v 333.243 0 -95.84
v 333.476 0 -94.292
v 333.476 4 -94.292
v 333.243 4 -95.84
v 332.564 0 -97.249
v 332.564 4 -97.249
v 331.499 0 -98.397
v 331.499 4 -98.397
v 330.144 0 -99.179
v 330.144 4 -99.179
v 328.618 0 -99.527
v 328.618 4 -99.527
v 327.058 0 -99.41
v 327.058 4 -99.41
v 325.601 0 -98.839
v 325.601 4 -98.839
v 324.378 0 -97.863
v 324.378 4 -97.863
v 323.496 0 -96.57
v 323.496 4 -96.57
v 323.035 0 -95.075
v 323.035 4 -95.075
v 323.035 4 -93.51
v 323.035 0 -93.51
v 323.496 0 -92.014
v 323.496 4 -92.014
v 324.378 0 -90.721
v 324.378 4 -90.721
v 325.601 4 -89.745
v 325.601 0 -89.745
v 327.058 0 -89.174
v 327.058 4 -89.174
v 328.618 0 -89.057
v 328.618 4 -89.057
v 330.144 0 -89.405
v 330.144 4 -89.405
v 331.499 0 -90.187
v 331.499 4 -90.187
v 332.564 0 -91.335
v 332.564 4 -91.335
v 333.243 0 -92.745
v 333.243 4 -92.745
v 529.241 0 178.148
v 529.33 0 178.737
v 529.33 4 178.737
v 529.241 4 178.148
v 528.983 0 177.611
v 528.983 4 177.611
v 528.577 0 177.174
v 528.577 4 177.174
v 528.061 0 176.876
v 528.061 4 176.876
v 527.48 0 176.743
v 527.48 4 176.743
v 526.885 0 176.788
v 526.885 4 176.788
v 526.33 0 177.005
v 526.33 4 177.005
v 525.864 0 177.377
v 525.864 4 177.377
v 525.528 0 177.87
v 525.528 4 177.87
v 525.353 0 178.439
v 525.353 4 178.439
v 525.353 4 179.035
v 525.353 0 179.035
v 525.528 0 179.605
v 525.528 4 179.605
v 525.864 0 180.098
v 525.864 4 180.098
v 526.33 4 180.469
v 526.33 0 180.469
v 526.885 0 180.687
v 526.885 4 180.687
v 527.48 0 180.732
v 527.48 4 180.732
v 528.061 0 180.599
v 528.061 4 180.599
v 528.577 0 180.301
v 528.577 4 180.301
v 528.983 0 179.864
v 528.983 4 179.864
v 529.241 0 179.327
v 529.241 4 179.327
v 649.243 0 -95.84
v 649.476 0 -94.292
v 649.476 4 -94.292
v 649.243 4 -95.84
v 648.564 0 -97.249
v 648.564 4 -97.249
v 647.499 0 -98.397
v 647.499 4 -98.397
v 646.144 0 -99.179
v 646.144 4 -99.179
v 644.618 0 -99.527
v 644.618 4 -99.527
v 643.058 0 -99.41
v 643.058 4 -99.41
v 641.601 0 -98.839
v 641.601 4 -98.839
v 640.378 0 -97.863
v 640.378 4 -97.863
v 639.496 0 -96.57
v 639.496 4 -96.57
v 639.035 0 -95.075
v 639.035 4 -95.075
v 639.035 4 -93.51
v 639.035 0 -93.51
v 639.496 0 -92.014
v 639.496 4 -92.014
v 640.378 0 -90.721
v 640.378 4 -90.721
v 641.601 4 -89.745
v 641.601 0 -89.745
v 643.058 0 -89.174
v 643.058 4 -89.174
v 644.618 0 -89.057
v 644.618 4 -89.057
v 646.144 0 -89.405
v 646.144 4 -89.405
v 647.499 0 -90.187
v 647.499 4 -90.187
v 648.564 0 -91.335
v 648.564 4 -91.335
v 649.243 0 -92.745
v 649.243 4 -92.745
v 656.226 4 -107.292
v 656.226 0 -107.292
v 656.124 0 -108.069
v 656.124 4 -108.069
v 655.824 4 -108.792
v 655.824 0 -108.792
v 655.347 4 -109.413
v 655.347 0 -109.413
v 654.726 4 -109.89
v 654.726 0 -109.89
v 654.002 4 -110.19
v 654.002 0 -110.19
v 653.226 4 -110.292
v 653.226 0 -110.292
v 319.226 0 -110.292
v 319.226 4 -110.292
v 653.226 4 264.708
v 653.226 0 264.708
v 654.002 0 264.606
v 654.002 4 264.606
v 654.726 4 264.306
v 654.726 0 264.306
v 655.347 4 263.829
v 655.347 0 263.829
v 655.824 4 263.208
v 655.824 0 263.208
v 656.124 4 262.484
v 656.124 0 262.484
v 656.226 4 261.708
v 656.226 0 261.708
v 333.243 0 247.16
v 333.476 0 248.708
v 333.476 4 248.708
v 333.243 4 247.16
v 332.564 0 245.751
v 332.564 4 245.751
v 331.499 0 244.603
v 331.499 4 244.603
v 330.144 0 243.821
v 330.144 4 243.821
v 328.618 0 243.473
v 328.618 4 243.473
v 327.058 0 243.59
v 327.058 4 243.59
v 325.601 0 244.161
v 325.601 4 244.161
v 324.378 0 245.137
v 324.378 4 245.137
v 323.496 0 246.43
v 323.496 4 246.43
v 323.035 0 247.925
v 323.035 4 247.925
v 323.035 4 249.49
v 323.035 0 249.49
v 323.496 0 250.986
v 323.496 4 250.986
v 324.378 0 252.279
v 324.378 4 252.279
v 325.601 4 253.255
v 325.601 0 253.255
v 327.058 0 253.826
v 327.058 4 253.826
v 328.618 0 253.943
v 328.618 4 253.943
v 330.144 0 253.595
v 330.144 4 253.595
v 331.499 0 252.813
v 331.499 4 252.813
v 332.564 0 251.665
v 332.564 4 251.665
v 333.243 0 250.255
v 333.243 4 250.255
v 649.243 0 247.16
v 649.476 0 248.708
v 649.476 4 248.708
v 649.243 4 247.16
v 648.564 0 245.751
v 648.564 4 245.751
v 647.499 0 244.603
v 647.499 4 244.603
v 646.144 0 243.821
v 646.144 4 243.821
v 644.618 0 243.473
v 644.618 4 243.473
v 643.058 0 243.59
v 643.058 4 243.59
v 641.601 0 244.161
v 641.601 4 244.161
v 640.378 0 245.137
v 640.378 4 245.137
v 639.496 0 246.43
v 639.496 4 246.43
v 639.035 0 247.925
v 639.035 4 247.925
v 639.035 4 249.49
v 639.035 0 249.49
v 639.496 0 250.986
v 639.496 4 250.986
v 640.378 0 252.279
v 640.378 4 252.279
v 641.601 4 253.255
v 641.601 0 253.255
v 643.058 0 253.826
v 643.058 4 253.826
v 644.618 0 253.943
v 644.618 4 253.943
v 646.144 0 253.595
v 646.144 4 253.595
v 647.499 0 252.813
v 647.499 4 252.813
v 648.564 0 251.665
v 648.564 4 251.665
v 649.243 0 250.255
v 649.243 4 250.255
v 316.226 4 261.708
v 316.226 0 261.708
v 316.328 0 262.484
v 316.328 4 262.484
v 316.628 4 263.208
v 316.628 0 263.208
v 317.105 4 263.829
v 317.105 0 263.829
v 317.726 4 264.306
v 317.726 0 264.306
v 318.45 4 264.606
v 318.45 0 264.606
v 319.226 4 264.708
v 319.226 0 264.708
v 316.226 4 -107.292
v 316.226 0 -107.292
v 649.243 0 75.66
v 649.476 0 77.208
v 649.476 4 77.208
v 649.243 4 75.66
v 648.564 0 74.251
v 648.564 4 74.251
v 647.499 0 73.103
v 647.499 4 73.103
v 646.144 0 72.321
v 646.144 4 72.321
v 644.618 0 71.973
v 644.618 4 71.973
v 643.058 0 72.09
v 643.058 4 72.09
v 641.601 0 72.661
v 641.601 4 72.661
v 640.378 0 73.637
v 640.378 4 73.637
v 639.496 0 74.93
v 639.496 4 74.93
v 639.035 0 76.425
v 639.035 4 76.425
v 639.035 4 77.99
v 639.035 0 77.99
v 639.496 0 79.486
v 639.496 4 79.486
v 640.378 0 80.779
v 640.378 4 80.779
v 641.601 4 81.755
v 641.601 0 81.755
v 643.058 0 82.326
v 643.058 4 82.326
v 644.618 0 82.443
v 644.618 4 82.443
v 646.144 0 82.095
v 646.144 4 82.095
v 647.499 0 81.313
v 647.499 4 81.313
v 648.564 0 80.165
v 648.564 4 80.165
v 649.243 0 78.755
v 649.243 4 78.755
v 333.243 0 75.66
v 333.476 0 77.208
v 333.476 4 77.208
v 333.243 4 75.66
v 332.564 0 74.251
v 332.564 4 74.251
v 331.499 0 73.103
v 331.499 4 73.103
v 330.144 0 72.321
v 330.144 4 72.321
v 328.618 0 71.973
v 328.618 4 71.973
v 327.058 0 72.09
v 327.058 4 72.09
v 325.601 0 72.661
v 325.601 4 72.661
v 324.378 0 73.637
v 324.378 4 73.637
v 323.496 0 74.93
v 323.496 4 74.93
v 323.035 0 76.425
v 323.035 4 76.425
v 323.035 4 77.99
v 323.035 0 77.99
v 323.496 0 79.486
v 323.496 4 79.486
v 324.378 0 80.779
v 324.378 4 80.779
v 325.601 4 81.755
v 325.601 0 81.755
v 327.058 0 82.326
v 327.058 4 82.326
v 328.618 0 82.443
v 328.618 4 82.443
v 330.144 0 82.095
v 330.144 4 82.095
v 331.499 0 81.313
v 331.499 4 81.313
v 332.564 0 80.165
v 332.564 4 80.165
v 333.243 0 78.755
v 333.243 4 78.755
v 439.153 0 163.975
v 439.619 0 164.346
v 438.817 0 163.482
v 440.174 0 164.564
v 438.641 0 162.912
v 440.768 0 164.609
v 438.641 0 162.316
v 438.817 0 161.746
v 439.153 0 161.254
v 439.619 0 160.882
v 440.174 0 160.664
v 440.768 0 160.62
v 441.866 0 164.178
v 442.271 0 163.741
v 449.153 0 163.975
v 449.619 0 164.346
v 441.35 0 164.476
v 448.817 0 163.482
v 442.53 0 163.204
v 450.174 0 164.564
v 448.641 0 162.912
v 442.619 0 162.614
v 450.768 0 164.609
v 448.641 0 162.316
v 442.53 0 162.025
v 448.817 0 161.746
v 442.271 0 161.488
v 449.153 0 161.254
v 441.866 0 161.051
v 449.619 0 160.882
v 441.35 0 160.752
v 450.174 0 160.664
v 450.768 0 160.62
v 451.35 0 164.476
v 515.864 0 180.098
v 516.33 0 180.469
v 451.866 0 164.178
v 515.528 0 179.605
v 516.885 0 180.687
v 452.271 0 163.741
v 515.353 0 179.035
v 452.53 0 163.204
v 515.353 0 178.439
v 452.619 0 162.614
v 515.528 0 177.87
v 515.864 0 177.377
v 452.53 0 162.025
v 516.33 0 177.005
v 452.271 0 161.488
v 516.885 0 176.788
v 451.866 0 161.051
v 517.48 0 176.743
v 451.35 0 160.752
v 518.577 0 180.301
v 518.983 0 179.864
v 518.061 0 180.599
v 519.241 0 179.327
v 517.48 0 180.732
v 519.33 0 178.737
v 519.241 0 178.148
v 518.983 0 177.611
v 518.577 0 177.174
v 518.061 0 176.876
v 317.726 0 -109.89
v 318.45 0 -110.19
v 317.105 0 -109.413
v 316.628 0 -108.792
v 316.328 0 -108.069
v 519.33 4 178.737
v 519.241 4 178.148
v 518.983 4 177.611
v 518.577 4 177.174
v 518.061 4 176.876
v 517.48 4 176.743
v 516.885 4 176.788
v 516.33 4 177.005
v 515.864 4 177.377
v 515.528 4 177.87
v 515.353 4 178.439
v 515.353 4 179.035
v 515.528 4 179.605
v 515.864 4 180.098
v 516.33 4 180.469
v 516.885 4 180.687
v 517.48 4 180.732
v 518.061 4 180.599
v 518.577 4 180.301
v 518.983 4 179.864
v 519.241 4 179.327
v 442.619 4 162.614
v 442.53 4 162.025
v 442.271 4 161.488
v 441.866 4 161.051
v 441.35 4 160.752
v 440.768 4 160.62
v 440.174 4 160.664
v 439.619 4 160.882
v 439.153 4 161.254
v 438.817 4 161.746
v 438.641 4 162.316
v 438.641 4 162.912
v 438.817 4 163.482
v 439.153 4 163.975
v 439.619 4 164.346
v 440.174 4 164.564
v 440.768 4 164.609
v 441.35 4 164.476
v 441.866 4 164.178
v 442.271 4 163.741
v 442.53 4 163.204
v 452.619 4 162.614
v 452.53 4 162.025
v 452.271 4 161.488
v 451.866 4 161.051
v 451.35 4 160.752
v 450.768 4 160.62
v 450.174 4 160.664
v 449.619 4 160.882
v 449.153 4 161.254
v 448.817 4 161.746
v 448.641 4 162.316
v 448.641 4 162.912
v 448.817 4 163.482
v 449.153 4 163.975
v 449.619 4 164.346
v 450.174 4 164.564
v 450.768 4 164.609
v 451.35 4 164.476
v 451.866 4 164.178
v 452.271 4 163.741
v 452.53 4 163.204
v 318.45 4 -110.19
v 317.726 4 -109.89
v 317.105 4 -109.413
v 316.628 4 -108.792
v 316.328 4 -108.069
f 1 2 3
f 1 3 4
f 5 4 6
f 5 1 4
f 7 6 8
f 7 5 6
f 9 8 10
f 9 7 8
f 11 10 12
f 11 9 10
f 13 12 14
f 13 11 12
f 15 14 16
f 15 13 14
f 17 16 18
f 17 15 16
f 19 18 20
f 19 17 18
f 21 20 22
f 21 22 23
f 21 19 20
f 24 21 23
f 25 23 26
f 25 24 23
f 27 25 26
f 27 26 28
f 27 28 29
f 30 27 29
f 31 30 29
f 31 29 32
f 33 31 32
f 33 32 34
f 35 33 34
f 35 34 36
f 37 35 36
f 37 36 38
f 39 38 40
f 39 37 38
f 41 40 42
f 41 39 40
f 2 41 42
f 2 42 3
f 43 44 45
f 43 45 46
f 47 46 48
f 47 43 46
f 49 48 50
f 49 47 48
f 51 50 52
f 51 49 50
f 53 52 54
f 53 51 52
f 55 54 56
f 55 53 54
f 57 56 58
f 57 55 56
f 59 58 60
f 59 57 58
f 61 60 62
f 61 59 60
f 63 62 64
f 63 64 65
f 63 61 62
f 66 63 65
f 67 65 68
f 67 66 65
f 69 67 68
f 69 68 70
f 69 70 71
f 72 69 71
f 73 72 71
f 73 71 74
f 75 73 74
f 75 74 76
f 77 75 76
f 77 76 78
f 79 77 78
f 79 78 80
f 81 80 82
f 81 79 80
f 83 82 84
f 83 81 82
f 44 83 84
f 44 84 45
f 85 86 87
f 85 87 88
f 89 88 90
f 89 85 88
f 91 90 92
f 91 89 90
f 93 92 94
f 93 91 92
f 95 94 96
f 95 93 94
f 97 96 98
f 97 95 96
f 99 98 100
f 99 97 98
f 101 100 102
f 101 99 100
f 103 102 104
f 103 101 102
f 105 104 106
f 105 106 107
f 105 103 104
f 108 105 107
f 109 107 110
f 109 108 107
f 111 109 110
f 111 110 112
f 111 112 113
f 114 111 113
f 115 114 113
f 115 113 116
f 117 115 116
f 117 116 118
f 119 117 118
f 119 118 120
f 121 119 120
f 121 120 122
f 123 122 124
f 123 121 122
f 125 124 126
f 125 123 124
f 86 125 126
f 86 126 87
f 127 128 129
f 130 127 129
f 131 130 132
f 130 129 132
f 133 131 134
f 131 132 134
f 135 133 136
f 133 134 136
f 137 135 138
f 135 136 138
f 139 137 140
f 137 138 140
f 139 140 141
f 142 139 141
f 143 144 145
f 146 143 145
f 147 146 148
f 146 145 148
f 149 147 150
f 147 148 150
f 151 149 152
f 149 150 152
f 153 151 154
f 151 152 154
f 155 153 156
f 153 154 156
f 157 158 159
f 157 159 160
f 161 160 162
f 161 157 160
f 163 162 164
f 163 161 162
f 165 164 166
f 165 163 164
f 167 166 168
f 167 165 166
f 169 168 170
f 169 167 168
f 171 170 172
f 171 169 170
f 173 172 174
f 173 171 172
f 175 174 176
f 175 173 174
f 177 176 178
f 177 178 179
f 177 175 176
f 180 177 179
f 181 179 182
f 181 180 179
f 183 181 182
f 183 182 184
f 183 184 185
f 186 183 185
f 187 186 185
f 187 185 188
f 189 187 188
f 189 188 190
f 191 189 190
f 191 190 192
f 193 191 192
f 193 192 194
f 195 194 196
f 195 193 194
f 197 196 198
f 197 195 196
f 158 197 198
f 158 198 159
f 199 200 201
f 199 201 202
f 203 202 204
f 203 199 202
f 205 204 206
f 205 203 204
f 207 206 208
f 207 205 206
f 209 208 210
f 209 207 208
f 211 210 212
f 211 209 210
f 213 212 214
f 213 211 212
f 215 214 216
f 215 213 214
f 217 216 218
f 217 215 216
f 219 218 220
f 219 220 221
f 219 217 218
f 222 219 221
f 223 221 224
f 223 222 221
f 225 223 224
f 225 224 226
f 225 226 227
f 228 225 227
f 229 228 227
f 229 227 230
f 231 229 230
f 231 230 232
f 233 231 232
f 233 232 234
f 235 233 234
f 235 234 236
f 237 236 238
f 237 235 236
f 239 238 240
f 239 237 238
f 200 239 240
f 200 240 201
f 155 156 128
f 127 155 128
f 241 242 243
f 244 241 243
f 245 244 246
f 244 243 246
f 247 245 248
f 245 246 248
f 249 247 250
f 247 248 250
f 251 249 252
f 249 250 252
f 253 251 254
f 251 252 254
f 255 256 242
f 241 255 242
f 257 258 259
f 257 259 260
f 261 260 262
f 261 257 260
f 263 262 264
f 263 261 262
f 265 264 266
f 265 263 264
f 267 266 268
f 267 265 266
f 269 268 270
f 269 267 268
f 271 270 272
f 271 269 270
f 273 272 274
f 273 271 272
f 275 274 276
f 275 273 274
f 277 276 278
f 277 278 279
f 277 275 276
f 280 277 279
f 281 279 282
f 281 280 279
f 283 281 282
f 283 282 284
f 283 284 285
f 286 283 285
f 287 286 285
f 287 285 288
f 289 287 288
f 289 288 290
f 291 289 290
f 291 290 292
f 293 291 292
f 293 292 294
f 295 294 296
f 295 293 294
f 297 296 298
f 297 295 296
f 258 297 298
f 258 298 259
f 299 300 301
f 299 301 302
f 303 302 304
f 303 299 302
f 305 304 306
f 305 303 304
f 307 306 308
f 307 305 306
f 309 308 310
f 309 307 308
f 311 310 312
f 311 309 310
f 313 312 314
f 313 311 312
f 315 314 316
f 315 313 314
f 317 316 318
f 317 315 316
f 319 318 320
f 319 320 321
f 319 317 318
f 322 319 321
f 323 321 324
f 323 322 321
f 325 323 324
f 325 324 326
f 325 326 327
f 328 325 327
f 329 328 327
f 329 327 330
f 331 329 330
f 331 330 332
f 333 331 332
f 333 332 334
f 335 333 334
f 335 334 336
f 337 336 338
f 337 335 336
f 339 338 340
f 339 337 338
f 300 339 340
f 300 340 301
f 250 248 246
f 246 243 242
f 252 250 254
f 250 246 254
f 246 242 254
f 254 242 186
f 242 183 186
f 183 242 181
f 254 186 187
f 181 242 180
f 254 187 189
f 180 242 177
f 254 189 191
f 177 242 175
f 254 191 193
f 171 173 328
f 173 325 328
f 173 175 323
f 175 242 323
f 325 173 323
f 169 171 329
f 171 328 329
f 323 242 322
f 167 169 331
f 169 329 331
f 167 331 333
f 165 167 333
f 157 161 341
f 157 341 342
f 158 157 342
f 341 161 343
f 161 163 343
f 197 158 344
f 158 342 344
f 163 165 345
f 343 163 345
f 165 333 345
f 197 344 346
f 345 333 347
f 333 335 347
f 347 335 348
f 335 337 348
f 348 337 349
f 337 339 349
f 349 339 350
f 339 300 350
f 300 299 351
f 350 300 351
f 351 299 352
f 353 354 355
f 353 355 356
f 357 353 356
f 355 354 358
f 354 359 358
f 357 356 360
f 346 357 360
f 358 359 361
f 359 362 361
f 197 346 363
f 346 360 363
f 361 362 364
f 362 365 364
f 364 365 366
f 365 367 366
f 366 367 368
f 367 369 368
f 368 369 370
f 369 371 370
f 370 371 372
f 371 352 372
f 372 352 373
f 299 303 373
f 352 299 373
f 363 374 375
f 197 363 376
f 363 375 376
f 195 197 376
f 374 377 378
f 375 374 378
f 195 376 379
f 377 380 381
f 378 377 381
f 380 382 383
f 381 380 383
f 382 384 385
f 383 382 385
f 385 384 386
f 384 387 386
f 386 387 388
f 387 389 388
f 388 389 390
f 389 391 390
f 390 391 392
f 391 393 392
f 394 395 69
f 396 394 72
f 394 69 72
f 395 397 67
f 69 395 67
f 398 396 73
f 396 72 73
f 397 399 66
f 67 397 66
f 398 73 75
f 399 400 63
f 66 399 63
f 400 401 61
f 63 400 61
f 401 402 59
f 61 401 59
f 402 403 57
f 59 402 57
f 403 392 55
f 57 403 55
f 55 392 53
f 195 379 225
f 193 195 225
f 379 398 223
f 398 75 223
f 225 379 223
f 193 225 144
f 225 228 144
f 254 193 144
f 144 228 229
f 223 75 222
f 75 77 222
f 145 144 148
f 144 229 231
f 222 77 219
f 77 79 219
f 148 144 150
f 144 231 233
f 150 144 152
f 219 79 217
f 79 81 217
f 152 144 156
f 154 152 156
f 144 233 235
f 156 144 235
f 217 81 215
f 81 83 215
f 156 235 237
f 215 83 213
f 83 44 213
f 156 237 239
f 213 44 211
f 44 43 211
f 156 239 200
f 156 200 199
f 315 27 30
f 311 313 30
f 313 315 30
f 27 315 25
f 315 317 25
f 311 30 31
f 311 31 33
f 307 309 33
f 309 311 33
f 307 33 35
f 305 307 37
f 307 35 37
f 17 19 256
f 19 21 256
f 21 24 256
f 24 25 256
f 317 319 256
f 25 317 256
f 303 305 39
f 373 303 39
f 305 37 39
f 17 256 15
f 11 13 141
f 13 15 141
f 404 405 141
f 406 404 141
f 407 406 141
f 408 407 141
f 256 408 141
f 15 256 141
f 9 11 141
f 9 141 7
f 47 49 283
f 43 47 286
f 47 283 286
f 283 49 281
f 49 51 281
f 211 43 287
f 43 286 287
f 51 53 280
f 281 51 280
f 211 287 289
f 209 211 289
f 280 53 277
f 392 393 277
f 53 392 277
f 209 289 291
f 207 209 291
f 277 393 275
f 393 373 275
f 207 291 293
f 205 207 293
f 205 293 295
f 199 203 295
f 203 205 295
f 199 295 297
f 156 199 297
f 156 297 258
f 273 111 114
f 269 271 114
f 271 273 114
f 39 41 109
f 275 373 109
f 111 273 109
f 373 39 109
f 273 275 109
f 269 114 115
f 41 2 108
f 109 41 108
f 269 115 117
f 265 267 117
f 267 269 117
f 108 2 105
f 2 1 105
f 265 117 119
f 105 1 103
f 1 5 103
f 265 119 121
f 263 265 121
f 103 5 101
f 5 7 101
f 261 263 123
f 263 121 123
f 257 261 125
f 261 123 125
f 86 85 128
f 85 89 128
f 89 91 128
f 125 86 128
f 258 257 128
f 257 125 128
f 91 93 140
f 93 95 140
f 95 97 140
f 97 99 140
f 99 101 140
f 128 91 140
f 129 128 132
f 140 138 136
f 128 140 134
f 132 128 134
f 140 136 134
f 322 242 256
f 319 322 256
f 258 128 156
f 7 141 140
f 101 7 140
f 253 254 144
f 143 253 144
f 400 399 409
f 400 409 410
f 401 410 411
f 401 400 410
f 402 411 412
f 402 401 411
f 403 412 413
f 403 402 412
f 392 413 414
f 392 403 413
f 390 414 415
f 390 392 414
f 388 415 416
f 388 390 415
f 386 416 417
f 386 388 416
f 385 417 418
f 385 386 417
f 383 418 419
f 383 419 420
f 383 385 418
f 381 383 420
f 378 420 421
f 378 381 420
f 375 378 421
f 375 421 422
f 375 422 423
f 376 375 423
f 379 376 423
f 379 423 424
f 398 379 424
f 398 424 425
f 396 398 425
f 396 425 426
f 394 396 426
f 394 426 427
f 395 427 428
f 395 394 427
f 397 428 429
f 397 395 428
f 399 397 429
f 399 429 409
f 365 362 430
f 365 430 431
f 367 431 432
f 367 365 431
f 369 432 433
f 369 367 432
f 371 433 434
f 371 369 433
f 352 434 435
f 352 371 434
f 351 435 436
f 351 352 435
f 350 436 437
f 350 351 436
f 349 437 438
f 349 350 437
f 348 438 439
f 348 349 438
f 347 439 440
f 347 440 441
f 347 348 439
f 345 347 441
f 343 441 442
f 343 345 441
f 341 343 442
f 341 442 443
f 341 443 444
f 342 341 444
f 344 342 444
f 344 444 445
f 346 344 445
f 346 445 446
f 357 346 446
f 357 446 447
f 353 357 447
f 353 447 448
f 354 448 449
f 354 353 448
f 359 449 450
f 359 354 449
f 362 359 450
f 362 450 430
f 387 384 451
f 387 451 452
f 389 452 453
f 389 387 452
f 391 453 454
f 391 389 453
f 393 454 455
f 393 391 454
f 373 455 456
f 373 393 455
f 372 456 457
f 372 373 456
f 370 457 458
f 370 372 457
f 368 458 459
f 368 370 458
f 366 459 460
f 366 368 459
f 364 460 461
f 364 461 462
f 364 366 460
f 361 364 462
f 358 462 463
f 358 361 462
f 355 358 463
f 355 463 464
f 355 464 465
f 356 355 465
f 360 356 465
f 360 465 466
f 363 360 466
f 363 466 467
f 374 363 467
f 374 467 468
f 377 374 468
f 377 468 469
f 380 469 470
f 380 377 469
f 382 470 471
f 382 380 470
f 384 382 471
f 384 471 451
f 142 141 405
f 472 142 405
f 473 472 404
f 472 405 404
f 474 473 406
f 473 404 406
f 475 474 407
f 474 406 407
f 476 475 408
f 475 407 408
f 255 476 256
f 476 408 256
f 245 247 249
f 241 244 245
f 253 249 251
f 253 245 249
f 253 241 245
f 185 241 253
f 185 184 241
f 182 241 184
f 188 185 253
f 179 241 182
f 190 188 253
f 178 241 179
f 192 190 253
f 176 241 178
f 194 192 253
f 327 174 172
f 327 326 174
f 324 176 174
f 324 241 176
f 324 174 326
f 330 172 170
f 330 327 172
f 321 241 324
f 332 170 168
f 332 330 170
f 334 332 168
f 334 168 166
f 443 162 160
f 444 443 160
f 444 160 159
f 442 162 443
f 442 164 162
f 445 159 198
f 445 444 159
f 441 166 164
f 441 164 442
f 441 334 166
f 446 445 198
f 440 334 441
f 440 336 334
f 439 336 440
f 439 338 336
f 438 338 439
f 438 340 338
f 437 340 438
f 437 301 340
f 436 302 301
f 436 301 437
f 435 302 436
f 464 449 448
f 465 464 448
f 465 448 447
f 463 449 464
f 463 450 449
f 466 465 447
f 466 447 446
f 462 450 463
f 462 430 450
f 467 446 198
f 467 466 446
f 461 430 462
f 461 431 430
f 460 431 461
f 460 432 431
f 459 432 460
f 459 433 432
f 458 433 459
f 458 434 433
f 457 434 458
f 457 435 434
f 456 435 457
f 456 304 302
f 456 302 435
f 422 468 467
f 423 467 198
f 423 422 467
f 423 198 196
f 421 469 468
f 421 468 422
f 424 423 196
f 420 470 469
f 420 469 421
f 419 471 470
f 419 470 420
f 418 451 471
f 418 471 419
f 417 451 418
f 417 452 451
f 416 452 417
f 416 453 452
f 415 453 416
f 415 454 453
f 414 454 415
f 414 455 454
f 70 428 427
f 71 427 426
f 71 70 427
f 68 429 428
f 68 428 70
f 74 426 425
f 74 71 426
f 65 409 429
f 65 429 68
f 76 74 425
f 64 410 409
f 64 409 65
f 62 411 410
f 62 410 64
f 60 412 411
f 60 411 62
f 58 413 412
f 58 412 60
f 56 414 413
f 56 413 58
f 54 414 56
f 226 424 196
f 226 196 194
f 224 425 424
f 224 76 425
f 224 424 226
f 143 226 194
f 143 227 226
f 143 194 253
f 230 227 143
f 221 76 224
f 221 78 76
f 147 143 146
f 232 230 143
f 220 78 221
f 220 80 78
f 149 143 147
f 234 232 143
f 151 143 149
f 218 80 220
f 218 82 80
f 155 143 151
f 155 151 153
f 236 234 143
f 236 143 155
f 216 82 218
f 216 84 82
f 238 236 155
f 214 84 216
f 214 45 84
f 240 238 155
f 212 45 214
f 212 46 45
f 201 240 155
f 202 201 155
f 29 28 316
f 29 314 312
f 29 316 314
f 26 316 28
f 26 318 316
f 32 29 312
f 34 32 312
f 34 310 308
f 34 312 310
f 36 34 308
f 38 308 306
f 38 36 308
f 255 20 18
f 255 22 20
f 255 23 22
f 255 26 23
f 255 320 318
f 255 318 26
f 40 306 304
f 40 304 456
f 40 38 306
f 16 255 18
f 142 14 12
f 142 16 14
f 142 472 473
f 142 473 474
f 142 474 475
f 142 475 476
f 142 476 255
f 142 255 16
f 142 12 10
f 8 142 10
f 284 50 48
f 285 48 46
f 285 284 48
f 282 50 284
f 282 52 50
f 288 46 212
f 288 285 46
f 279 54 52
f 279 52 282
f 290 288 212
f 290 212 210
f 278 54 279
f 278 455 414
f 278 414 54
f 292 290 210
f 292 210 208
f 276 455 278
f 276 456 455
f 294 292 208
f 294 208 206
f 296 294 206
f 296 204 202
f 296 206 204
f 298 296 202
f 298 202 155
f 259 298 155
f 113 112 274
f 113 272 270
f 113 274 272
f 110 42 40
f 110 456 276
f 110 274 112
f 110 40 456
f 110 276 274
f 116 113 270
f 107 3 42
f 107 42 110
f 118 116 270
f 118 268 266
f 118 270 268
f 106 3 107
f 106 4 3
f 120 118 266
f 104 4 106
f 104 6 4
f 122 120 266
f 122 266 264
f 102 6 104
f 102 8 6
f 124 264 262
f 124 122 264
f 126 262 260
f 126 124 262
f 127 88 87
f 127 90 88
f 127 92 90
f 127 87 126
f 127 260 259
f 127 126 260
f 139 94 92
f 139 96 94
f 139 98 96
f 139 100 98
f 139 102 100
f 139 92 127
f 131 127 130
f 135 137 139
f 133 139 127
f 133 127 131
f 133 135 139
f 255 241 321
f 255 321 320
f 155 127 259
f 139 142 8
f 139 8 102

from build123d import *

# Parameters (mm, degrees)
SKETCH1_R           = 2
SKETCH1_R_2         = 5.25
BOSS_EXTRUDE1_DEPTH = 4


with BuildPart() as part:
    # Sketch1 → Boss-Extrude1 (new body)
    with BuildSketch(Plane(origin=(0, 0, 0), x_dir=(1, 0, 0), z_dir=(0, 1, 0))):
        with BuildLine():
            Line((316.226041149, 107.292047617), (316.226041149, -261.707952383))
            ThreePointArc((316.226041149, -261.707952383), (317.104720805, -263.829272726), (319.226041149, -264.707952383))
            Line((319.226041149, -264.707952383), (653.226041149, -264.707952383))
            ThreePointArc((653.226041149, -264.707952383), (655.347361492, -263.829272726), (656.226041149, -261.707952383))
            Line((656.226041149, -261.707952383), (656.226041149, 107.292047617))
            ThreePointArc((656.226041149, 107.292047617), (655.347361492, 109.413367961), (653.226041149, 110.292047617))
            Line((653.226041149, 110.292047617), (319.226041149, 110.292047617))
            ThreePointArc((319.226041149, 110.292047617), (317.104720805, 109.413367961), (316.226041149, 107.292047617))
        make_face()
        with Locations((450.618955235, -162.614244131)):
            Circle(SKETCH1_R, mode=Mode.SUBTRACT)
        with Locations((440.618955235, -162.614244131)):
            Circle(SKETCH1_R, mode=Mode.SUBTRACT)
        with Locations((517.330184073, -178.73741306)):
            Circle(SKETCH1_R, mode=Mode.SUBTRACT)
        with Locations((644.226041149, -77.207952383)):
            Circle(SKETCH1_R_2, mode=Mode.SUBTRACT)
        with Locations((328.226041149, -77.207952383)):
            Circle(SKETCH1_R_2, mode=Mode.SUBTRACT)
        with Locations((644.226041149, 94.292047617)):
            Circle(SKETCH1_R_2, mode=Mode.SUBTRACT)
        with Locations((328.226041149, 94.292047617)):
            Circle(SKETCH1_R_2, mode=Mode.SUBTRACT)
        with Locations((328.226041149, -248.707952383)):
            Circle(SKETCH1_R_2, mode=Mode.SUBTRACT)
        with Locations((644.226041149, -248.707952383)):
            Circle(SKETCH1_R_2, mode=Mode.SUBTRACT)
        with Locations((527.330184073, -178.73741306)):
            Circle(SKETCH1_R, mode=Mode.SUBTRACT)
    extrude(amount=BOSS_EXTRUDE1_DEPTH)


solid = part.part
